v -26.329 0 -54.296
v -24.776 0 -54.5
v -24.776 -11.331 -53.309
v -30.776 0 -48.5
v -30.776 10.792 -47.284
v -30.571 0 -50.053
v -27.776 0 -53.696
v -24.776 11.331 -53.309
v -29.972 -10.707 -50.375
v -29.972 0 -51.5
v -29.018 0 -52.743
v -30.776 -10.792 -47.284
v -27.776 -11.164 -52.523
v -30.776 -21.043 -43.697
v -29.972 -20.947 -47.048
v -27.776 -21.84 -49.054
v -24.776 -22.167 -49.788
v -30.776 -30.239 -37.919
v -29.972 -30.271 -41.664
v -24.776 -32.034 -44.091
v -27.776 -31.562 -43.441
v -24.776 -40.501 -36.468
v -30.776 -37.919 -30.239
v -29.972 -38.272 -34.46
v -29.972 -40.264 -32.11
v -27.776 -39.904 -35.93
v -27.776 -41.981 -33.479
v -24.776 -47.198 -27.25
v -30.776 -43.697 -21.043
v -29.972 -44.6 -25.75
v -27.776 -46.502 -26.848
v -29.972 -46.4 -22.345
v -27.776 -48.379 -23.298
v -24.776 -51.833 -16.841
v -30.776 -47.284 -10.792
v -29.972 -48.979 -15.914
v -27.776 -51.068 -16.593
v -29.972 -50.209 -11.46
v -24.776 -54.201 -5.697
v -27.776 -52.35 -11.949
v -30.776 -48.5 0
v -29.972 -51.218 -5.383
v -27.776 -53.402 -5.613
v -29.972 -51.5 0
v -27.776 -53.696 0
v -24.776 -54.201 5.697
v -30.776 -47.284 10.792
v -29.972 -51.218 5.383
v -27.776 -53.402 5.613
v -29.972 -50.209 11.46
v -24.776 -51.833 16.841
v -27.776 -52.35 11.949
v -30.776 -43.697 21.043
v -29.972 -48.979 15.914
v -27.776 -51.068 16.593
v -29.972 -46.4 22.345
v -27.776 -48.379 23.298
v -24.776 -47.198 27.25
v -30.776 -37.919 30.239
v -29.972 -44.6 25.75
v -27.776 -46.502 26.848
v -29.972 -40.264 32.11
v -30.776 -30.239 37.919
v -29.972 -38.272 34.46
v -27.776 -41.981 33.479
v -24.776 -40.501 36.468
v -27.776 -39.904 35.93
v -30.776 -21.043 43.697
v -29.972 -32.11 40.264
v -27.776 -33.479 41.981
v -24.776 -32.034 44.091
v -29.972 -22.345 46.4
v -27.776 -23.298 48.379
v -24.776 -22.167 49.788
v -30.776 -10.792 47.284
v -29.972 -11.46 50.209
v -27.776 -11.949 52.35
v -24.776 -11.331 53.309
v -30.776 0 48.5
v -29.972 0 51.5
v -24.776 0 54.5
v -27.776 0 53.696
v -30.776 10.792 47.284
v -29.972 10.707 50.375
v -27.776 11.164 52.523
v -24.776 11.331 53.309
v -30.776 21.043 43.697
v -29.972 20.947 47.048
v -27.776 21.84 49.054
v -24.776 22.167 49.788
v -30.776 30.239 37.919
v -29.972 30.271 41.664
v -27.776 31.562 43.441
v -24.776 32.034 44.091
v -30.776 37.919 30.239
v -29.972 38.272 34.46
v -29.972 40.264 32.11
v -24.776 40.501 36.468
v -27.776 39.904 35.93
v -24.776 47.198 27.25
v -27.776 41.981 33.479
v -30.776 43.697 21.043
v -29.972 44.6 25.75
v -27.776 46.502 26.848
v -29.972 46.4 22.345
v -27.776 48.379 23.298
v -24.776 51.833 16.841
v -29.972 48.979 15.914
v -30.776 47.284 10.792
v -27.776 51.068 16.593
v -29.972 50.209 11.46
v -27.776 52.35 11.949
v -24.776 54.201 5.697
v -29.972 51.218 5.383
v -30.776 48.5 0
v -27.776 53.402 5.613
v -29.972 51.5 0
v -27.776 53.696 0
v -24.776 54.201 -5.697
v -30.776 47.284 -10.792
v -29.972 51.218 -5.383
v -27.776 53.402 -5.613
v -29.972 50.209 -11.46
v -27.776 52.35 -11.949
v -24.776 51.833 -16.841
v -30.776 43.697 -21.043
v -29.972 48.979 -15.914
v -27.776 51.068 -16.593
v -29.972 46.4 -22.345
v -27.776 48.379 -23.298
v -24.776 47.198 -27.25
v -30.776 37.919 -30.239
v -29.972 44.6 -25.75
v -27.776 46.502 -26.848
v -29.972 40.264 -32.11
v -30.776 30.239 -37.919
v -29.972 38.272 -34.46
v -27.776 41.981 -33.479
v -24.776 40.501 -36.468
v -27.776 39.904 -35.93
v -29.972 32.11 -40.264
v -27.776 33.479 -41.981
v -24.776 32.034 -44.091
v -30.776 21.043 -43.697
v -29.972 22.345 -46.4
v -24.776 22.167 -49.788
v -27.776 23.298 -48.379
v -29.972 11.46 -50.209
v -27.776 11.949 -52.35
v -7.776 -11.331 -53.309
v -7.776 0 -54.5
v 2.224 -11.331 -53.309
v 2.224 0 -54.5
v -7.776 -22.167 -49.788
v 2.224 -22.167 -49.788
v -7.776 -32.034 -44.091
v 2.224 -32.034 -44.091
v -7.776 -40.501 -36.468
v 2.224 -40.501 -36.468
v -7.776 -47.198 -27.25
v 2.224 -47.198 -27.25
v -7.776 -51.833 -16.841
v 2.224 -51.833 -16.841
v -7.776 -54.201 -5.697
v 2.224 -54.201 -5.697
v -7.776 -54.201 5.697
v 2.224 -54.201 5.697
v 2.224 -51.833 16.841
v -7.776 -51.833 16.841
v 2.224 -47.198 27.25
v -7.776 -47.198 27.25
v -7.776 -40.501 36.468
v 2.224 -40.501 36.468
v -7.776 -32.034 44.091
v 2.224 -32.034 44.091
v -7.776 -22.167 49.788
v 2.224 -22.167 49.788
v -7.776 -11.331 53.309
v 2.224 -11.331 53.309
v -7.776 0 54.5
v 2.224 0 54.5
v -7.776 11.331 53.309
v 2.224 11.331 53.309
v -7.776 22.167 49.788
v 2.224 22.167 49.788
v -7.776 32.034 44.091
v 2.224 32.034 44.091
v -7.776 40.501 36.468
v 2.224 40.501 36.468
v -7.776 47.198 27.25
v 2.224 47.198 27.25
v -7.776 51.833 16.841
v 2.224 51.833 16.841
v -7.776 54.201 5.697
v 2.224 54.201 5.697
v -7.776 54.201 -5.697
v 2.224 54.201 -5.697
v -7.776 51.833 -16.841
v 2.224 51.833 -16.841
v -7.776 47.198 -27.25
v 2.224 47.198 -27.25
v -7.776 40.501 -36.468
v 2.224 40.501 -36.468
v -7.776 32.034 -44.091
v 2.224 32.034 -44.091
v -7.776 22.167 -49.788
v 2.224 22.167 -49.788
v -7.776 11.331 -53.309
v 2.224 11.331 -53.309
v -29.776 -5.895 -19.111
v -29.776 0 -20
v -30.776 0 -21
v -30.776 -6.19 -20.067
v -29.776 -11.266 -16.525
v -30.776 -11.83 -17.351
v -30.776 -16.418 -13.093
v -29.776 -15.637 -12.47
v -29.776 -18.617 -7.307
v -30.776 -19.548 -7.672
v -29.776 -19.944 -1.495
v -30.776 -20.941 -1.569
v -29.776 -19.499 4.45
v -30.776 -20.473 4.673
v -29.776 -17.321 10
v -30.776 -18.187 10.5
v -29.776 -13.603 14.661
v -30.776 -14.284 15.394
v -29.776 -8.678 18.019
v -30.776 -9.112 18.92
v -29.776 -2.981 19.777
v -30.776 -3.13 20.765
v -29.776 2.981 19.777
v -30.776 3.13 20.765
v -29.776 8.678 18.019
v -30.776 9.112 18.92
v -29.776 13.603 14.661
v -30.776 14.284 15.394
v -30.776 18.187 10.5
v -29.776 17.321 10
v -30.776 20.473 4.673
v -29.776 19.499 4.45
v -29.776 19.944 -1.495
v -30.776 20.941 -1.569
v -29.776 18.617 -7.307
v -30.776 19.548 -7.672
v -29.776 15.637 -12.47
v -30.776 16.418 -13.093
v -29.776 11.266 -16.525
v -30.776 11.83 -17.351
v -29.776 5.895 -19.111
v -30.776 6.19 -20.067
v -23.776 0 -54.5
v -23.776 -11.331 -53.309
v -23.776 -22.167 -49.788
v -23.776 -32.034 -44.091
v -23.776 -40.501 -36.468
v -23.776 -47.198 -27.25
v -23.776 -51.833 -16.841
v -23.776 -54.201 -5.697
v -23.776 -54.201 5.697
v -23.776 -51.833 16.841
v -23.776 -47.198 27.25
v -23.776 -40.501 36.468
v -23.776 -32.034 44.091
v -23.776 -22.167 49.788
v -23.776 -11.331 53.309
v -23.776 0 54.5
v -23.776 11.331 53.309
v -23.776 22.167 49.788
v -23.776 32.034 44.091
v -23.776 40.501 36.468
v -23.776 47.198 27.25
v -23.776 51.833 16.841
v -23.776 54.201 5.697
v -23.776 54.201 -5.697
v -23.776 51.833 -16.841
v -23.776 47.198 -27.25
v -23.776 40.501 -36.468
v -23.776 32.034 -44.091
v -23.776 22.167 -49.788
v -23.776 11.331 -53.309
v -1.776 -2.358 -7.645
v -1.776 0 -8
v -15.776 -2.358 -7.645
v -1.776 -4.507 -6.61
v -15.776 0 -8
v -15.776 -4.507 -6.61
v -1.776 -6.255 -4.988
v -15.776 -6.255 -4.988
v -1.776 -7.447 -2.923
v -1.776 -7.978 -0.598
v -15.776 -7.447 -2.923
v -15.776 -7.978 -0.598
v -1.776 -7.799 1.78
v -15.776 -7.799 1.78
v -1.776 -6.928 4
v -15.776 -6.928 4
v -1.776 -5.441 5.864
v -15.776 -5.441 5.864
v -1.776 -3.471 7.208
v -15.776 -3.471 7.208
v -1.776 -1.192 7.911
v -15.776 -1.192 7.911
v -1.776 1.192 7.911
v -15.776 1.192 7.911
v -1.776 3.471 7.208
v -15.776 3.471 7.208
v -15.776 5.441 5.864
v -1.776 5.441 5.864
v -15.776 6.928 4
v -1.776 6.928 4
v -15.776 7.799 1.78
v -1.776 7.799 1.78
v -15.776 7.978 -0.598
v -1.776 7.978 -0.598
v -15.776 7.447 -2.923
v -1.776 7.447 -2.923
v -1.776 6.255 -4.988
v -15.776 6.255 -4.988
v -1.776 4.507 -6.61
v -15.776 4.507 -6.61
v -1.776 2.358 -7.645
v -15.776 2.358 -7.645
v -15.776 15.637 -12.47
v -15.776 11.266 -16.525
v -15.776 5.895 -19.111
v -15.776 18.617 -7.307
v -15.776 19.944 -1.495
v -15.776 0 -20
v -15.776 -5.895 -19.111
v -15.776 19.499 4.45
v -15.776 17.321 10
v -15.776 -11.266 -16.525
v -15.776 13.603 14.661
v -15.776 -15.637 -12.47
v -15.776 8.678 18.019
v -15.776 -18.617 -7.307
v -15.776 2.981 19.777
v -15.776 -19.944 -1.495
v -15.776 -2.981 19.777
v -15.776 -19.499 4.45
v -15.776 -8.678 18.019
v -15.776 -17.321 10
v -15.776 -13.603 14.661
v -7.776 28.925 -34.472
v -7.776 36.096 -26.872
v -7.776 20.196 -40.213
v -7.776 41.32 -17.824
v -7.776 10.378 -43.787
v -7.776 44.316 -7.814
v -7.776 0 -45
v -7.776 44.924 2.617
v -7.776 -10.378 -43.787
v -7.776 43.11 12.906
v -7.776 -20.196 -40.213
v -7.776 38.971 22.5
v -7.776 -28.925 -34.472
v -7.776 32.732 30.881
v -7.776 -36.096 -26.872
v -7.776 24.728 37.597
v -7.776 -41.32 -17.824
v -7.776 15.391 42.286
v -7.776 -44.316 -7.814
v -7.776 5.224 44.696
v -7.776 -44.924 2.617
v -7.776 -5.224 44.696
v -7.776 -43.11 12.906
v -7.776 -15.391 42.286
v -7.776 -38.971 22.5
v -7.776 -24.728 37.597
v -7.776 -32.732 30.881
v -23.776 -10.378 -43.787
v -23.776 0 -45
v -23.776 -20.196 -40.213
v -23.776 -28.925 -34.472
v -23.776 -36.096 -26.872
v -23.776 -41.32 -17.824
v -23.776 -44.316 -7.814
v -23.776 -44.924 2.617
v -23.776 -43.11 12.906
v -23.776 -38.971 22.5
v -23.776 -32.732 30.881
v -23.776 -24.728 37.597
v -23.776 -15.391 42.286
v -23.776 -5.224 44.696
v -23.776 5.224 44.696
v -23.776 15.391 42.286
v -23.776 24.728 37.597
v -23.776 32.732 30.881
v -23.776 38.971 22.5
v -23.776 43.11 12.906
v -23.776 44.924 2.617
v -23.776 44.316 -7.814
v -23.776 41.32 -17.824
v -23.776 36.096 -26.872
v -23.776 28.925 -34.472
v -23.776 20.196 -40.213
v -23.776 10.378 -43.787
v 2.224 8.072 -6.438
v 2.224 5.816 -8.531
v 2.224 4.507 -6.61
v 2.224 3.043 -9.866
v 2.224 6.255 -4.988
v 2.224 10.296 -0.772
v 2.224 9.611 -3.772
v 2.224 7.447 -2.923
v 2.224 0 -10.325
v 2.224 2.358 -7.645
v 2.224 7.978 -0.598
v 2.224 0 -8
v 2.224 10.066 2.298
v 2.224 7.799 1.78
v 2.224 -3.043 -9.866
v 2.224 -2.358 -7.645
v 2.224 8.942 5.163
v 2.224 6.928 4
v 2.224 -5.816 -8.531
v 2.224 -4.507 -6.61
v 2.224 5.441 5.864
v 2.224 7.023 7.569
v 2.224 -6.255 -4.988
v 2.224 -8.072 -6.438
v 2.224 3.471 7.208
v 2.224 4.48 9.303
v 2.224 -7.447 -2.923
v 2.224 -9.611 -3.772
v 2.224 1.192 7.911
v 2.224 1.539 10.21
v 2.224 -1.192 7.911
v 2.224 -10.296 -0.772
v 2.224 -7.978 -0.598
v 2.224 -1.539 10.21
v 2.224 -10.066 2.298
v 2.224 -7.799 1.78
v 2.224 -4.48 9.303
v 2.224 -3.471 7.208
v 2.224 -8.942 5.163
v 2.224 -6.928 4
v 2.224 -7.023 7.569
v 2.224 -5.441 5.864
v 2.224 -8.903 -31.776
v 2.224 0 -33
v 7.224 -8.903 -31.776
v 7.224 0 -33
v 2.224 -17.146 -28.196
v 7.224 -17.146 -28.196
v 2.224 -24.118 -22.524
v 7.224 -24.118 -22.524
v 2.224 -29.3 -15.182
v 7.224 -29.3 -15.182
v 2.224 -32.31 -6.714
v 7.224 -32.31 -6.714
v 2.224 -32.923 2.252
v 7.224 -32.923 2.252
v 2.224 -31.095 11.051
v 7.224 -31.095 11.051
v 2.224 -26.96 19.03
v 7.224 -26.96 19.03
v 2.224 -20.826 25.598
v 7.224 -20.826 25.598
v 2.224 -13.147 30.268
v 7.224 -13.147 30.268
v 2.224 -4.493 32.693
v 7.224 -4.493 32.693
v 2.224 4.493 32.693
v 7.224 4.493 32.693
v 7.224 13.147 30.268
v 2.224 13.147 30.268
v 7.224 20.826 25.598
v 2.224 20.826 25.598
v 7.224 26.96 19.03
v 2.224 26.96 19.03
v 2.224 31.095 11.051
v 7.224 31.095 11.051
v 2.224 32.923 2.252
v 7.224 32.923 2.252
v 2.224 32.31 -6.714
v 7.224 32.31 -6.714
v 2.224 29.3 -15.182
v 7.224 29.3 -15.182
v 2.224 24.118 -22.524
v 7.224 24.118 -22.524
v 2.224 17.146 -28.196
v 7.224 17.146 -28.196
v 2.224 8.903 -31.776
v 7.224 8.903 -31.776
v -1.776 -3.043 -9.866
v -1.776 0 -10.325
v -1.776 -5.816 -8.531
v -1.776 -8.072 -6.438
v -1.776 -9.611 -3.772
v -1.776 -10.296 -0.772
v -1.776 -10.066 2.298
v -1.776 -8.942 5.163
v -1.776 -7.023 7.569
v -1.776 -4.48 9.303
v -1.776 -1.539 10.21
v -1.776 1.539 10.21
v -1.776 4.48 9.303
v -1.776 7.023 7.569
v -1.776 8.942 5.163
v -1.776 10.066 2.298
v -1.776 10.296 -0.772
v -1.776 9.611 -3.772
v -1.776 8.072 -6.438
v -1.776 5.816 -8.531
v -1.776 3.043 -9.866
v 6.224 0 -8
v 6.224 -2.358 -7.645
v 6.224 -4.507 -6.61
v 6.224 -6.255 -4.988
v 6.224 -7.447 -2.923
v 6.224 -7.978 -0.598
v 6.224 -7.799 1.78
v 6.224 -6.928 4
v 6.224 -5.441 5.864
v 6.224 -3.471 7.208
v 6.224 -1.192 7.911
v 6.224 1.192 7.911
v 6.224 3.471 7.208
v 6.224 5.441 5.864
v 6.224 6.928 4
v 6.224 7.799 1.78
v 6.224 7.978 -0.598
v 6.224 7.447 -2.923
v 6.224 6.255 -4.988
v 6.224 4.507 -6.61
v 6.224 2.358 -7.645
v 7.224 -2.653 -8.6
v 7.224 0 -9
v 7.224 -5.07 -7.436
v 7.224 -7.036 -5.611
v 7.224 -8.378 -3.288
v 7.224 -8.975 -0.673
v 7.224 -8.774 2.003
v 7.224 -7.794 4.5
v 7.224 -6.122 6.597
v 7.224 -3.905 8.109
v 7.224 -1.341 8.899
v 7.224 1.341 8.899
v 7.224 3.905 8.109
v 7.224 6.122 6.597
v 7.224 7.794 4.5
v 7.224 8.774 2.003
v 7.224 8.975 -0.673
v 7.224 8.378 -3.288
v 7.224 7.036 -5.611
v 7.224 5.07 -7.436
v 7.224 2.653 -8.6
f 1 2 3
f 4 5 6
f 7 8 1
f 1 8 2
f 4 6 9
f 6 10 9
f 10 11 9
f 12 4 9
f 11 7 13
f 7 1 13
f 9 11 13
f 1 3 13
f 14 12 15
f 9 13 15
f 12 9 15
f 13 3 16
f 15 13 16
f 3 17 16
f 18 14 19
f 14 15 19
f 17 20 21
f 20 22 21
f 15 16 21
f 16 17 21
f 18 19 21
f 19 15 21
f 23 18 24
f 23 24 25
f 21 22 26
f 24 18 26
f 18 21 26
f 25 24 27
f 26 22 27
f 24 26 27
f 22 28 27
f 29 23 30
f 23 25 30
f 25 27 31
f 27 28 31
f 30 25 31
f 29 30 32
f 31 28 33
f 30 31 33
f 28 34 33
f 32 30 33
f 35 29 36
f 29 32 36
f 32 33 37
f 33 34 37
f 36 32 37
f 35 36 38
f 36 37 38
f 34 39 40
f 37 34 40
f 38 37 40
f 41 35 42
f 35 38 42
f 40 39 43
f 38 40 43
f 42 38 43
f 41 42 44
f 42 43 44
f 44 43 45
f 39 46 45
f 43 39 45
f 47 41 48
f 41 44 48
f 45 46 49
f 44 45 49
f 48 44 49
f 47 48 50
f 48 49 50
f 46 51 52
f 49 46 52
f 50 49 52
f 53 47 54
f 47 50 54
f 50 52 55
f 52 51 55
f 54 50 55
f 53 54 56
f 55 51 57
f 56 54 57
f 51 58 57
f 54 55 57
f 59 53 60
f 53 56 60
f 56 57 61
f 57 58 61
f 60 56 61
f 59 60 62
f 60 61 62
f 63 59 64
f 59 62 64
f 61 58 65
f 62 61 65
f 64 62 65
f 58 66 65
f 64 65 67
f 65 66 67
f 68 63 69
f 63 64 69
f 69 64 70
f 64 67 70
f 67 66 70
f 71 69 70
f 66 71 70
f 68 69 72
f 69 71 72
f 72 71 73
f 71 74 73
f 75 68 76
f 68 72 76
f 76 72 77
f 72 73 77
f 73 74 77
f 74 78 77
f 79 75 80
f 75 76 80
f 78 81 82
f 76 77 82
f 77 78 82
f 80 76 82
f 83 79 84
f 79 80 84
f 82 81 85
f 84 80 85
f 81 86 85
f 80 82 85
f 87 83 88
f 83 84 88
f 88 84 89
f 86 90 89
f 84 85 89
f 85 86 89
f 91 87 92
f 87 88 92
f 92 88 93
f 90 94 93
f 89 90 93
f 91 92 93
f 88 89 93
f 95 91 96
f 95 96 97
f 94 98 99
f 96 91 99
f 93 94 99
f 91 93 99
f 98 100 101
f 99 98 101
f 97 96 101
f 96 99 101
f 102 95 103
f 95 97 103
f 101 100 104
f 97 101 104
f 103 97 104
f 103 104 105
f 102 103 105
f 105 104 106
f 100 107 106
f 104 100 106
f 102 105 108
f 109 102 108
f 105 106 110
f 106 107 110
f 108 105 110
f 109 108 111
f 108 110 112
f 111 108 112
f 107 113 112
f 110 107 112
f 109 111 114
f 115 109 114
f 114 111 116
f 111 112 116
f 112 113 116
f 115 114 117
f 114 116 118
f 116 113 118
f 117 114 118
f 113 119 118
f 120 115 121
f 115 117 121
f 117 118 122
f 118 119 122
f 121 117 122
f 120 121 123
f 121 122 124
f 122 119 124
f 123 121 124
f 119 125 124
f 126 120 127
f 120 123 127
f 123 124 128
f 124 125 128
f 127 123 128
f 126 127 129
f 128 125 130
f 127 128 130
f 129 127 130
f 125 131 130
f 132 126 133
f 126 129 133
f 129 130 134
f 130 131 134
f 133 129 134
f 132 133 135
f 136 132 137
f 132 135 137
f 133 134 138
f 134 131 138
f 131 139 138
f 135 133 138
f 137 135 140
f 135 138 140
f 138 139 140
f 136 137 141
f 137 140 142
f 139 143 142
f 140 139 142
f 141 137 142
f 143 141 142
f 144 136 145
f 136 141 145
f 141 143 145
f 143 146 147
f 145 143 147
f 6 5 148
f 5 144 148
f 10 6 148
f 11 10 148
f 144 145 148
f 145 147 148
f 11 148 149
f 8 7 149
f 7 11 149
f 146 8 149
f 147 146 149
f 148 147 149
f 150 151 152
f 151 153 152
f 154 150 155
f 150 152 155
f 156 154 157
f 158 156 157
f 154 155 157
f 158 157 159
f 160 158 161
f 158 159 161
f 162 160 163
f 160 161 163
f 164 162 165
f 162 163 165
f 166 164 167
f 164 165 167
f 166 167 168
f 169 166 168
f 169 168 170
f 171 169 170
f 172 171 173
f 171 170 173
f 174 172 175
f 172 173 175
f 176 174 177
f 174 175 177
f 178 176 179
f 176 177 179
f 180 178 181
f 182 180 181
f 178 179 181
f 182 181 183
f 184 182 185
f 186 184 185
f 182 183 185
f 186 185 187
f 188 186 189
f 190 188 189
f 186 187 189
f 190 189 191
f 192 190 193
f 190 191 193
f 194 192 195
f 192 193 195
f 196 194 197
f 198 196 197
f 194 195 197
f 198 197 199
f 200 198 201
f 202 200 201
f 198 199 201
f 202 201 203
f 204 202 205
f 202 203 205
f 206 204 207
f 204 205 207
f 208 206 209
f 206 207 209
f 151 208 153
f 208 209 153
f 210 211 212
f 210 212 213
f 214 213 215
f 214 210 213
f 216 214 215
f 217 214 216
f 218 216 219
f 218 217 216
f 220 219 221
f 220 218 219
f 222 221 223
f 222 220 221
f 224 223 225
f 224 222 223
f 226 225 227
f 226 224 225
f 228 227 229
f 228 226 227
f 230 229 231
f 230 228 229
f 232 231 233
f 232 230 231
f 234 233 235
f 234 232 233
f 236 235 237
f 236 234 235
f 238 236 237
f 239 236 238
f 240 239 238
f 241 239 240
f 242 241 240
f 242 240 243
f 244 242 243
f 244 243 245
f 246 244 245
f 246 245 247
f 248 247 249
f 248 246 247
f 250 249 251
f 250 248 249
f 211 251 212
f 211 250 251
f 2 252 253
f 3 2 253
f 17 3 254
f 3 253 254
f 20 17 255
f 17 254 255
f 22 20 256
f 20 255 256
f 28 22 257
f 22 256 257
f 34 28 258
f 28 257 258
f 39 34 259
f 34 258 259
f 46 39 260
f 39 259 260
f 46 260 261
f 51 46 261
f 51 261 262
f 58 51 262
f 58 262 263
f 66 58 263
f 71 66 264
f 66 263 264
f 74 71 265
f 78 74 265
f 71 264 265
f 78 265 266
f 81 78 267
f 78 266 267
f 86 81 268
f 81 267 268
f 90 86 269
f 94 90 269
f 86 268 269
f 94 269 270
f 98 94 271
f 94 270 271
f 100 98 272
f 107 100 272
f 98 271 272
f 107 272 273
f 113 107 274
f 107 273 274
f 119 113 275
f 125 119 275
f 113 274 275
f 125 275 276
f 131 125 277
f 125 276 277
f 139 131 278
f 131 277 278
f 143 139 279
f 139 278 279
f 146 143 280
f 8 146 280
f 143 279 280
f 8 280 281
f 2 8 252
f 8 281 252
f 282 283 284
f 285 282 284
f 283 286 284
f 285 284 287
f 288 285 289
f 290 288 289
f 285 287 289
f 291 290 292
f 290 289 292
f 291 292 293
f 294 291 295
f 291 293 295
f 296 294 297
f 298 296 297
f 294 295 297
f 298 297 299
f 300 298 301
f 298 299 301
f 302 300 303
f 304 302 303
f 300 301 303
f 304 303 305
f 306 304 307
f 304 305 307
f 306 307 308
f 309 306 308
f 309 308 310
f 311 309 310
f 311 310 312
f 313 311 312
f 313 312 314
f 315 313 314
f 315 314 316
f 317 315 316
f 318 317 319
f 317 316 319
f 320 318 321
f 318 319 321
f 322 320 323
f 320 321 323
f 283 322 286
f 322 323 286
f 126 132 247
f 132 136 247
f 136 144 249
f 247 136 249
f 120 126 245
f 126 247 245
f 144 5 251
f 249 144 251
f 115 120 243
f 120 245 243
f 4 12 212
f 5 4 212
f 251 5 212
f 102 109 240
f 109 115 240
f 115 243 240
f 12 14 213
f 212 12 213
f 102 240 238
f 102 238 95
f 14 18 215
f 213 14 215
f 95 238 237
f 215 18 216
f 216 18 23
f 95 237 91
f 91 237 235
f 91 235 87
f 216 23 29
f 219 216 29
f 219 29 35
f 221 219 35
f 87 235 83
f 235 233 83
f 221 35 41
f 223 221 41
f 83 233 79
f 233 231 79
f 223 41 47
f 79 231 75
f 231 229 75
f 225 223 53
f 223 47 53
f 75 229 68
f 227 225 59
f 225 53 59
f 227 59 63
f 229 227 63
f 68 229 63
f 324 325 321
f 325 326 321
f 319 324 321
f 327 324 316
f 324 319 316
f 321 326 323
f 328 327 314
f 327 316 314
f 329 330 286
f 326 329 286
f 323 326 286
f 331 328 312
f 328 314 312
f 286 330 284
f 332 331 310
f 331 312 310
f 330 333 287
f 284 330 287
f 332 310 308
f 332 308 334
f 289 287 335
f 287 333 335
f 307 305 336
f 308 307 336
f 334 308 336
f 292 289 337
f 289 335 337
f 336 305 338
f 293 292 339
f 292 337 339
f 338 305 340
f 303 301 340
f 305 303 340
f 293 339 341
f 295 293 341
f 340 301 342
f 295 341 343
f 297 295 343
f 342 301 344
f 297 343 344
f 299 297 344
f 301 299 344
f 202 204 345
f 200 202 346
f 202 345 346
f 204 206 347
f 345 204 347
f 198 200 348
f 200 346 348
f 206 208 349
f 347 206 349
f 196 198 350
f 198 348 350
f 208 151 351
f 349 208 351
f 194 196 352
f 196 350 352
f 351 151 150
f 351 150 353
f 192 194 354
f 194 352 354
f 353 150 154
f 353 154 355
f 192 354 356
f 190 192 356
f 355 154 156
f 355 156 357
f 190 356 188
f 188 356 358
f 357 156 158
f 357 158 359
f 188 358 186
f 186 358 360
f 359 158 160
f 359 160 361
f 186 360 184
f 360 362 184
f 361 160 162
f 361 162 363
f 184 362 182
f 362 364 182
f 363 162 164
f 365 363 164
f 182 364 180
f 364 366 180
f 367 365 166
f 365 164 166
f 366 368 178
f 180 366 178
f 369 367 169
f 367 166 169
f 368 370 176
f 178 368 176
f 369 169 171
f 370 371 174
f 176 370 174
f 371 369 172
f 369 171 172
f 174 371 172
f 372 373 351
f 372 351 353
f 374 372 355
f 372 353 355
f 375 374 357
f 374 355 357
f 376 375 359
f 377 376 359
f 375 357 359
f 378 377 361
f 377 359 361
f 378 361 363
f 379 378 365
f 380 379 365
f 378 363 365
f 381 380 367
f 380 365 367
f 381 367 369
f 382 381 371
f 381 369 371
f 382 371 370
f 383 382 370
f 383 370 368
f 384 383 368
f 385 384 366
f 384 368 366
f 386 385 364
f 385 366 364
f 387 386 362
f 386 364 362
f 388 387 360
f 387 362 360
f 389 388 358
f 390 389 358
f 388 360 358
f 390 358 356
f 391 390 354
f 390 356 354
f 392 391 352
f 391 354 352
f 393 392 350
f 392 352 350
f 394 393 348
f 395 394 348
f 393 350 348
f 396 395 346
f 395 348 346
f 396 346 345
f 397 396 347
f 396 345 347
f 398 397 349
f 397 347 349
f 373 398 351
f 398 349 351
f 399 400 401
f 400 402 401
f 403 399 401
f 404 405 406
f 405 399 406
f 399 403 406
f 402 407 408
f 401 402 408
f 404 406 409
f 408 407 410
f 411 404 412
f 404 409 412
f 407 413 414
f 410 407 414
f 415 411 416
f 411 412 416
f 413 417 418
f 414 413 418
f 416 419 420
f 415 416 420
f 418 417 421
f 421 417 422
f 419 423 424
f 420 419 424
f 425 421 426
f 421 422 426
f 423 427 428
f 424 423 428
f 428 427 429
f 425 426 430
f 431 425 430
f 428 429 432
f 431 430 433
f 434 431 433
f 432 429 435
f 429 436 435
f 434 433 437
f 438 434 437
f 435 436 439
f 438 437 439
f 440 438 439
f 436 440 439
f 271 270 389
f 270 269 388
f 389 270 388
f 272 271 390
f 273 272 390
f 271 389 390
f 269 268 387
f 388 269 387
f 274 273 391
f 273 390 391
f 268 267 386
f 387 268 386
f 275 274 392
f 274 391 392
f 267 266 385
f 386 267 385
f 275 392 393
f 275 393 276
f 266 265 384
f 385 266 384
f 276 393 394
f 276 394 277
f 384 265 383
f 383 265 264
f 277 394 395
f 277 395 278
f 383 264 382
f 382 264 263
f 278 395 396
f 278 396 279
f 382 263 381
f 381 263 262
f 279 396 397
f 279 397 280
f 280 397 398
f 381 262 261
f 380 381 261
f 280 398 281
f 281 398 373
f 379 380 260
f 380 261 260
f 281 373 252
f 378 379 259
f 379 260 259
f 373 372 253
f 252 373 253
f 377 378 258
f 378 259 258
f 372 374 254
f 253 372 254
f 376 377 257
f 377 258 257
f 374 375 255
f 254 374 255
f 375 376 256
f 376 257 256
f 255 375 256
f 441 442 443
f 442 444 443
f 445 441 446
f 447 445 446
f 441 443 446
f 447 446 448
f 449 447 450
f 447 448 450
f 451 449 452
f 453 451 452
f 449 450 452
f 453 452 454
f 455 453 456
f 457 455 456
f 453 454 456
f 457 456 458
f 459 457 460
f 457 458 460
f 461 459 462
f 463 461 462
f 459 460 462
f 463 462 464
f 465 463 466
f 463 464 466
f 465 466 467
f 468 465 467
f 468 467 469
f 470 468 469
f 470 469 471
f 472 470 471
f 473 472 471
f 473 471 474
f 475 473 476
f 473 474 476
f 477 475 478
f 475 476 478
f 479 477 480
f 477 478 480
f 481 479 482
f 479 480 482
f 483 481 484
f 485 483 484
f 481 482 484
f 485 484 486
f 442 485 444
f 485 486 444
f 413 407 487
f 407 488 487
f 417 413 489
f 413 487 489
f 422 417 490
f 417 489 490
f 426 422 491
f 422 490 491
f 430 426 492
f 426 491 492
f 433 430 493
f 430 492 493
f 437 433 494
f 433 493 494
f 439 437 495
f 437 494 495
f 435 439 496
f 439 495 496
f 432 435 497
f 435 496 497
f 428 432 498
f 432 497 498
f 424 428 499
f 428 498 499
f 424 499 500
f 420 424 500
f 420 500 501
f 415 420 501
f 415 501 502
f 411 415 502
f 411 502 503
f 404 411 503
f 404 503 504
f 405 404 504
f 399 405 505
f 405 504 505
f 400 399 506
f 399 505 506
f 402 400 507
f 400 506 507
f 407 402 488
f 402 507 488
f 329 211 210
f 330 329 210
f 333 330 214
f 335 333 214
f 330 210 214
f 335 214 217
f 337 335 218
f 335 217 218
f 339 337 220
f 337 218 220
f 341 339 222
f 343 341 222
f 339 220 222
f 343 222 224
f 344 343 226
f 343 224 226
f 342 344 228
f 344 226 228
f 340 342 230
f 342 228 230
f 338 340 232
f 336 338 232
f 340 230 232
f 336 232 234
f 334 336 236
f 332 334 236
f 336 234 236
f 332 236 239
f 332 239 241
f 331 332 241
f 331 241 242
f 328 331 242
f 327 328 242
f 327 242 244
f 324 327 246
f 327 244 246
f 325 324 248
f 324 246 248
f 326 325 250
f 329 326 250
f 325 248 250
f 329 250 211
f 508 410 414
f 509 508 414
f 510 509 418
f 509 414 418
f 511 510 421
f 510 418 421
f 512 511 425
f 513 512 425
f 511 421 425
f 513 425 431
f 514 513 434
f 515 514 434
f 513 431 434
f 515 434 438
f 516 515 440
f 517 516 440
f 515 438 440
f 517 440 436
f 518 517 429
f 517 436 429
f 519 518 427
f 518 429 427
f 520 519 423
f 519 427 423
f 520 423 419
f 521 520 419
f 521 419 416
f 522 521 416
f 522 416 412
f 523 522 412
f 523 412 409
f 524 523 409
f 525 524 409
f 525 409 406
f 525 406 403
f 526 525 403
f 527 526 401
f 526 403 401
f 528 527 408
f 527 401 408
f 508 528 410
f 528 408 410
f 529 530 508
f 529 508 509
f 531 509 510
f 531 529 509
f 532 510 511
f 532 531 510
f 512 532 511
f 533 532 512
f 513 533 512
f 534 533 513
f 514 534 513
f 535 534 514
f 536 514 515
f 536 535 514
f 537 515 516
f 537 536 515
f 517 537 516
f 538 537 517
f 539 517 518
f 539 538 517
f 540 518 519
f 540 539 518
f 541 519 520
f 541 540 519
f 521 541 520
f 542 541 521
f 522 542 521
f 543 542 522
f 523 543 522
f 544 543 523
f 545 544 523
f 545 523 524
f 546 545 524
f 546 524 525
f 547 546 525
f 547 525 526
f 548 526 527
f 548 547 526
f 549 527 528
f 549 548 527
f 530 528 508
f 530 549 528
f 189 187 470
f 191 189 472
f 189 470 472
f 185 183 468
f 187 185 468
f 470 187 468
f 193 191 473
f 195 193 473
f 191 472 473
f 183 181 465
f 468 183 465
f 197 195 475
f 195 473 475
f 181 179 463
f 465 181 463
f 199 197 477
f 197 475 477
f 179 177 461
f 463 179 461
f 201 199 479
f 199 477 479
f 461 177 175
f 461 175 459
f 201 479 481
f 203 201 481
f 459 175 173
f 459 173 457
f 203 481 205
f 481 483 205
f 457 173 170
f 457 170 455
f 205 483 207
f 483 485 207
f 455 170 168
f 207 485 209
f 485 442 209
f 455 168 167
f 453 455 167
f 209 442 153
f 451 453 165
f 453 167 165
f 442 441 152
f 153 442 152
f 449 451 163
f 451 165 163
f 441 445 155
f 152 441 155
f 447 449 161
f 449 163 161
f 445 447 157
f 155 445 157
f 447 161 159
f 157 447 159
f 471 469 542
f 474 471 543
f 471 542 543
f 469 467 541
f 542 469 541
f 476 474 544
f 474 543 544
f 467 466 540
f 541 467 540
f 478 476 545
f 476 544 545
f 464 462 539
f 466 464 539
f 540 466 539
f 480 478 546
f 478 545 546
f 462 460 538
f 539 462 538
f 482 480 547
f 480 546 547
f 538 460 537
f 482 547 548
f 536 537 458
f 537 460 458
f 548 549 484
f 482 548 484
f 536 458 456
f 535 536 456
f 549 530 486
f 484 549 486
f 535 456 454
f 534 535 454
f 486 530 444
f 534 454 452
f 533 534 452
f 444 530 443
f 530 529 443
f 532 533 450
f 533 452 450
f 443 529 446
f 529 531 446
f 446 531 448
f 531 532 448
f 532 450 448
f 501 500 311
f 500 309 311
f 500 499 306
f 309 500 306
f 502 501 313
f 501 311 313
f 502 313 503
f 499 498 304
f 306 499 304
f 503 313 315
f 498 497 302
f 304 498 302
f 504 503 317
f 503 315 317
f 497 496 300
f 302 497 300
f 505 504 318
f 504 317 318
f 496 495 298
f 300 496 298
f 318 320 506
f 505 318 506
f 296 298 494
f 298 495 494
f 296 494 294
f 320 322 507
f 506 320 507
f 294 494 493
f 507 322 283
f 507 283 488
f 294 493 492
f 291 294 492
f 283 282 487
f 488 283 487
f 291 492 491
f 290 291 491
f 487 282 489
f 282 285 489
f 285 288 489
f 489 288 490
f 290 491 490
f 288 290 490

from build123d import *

# Parameters (mm, degrees)
F2_R    = 6
F3_SIZE = 1


with BuildPart() as f1:
    # F0 (on Front) → F1 (revolve)
    with BuildSketch(Plane.XZ):
        Polygon((-15.775755, -20), (-30.775755, -20), (-30.775755, -54.5), (-23.775755, -54.5), (-23.775755, -45), (-7.775755, -45), (-7.775755, -54.5), (2.224245, -54.5), (2.224245, -33), (7.224245, -33), (7.224245, -8), (2.224245, -8), (2.224245, -10.325), (-1.775755, -10.325), (-1.775755, -8), (-15.775755, -8), align=None)
    revolve(axis=Axis((-3.464836, 0, 0), (-1, 0, 0)))

    # F2
    f2_edges = [f1.edges().sort_by_distance(p)[0] for p in [
        (-30.775755, 0, 54.5),
    ]]
    fillet(f2_edges, radius=F2_R)

    # F3
    f3_edges = [f1.edges().sort_by_distance(p)[0] for p in [
        (-30.775755, 0, 20),
        (7.224245, 0, 8),
    ]]
    chamfer(f3_edges, length=F3_SIZE)


solid = f1.part
